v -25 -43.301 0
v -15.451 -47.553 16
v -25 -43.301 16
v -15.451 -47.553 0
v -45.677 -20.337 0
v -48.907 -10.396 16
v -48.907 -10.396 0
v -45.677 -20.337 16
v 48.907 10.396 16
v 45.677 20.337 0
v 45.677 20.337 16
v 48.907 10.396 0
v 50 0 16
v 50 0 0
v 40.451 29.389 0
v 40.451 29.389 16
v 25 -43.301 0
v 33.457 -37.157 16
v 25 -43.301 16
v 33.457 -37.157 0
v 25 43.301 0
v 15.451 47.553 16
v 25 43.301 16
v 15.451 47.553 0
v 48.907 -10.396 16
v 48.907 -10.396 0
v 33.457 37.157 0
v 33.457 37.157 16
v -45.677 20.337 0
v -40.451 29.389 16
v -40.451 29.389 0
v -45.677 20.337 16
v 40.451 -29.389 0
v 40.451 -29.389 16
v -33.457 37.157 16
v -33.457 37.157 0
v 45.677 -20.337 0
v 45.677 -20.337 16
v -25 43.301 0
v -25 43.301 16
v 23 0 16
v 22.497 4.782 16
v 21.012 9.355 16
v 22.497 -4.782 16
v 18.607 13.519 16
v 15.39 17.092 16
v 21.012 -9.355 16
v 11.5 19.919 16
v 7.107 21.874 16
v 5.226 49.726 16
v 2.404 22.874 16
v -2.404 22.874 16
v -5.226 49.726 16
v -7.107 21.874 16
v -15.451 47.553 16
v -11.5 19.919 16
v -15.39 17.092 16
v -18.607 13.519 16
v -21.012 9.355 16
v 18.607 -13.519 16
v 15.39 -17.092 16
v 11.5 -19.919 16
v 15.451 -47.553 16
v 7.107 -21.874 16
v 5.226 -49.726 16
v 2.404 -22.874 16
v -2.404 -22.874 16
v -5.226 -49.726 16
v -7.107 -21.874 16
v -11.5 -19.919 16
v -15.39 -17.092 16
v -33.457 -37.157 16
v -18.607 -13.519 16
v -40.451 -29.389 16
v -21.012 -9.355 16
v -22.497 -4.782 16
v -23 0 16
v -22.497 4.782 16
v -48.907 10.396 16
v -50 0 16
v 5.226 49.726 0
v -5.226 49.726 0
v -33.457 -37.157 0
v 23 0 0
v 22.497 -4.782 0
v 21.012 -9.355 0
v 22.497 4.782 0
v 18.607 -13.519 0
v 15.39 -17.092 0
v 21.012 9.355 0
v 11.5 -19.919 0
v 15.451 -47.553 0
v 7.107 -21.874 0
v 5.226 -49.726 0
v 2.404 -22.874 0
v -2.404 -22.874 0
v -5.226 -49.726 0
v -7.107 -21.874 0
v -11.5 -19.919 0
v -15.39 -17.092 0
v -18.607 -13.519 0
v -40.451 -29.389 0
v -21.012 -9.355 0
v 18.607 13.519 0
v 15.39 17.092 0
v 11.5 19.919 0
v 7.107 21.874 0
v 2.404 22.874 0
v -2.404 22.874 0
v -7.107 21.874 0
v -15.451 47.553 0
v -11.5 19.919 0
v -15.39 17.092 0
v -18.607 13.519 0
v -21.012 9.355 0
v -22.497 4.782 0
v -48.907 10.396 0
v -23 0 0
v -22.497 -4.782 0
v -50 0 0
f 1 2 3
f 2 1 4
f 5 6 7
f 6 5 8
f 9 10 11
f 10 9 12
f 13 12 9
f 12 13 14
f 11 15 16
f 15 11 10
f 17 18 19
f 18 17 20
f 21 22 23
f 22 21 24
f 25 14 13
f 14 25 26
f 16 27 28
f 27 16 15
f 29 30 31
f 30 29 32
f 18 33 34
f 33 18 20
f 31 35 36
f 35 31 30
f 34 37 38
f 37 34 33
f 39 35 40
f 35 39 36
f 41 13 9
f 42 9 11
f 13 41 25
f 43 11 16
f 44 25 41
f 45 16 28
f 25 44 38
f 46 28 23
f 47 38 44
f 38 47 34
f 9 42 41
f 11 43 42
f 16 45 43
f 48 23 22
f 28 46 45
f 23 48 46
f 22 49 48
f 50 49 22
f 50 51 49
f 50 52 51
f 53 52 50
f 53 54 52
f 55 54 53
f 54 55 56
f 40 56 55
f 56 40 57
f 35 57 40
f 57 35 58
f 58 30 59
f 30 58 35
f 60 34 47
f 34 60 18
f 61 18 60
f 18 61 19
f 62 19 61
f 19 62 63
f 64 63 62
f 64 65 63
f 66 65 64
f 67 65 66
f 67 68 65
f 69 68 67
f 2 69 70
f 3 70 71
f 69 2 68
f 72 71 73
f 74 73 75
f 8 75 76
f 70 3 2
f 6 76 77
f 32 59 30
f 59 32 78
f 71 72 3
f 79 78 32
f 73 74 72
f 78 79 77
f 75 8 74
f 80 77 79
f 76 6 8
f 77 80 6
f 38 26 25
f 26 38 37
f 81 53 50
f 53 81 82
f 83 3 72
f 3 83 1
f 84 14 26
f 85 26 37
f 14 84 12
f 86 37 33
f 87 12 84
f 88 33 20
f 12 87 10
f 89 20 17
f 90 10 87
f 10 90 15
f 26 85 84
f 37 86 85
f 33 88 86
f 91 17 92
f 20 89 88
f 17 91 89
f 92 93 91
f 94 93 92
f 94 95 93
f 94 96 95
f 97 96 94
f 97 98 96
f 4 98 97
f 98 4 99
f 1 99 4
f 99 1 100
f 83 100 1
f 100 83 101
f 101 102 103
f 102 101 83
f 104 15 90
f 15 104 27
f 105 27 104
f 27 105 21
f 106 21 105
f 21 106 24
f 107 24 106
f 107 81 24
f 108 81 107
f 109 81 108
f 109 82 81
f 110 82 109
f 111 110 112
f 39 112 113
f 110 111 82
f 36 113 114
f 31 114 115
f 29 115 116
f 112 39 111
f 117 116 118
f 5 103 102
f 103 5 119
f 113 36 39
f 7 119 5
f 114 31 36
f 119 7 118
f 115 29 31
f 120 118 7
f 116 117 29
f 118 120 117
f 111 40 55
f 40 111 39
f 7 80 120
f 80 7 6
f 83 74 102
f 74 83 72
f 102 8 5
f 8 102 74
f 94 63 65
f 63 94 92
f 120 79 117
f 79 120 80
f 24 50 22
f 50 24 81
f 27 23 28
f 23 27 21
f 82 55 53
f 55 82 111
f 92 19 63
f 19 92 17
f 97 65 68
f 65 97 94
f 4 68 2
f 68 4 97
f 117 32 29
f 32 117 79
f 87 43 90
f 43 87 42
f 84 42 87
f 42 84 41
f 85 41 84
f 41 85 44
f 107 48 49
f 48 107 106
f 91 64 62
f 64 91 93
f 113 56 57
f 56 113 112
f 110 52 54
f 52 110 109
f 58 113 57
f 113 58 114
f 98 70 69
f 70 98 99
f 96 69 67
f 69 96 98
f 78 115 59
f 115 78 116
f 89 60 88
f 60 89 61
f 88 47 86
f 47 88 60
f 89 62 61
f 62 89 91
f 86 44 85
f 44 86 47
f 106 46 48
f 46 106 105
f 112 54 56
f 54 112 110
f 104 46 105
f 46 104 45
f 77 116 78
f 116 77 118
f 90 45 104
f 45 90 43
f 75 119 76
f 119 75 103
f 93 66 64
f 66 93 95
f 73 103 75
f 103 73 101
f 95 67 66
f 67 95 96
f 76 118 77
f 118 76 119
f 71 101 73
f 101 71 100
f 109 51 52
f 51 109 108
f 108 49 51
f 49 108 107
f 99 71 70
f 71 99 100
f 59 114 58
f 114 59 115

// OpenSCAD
// file: config.scad
plate_length=200;
plate_width=200;
ext_length=100;
ext_width=100;
height=10;
wall_thickness=15;

collar_height = 16;
collar_r = 46/2;

lid_thickness=3;


pcb_pocket_depth = 1;
pcb_length=100;
pcb_width=150;
// main file
include <config.scad>

module vacuum_collar() {
	difference() {
		cylinder(r=ext_width/2,h=collar_height);
		cylinder(r=collar_r,h=collar_height);
	}
}

vacuum_collar();
